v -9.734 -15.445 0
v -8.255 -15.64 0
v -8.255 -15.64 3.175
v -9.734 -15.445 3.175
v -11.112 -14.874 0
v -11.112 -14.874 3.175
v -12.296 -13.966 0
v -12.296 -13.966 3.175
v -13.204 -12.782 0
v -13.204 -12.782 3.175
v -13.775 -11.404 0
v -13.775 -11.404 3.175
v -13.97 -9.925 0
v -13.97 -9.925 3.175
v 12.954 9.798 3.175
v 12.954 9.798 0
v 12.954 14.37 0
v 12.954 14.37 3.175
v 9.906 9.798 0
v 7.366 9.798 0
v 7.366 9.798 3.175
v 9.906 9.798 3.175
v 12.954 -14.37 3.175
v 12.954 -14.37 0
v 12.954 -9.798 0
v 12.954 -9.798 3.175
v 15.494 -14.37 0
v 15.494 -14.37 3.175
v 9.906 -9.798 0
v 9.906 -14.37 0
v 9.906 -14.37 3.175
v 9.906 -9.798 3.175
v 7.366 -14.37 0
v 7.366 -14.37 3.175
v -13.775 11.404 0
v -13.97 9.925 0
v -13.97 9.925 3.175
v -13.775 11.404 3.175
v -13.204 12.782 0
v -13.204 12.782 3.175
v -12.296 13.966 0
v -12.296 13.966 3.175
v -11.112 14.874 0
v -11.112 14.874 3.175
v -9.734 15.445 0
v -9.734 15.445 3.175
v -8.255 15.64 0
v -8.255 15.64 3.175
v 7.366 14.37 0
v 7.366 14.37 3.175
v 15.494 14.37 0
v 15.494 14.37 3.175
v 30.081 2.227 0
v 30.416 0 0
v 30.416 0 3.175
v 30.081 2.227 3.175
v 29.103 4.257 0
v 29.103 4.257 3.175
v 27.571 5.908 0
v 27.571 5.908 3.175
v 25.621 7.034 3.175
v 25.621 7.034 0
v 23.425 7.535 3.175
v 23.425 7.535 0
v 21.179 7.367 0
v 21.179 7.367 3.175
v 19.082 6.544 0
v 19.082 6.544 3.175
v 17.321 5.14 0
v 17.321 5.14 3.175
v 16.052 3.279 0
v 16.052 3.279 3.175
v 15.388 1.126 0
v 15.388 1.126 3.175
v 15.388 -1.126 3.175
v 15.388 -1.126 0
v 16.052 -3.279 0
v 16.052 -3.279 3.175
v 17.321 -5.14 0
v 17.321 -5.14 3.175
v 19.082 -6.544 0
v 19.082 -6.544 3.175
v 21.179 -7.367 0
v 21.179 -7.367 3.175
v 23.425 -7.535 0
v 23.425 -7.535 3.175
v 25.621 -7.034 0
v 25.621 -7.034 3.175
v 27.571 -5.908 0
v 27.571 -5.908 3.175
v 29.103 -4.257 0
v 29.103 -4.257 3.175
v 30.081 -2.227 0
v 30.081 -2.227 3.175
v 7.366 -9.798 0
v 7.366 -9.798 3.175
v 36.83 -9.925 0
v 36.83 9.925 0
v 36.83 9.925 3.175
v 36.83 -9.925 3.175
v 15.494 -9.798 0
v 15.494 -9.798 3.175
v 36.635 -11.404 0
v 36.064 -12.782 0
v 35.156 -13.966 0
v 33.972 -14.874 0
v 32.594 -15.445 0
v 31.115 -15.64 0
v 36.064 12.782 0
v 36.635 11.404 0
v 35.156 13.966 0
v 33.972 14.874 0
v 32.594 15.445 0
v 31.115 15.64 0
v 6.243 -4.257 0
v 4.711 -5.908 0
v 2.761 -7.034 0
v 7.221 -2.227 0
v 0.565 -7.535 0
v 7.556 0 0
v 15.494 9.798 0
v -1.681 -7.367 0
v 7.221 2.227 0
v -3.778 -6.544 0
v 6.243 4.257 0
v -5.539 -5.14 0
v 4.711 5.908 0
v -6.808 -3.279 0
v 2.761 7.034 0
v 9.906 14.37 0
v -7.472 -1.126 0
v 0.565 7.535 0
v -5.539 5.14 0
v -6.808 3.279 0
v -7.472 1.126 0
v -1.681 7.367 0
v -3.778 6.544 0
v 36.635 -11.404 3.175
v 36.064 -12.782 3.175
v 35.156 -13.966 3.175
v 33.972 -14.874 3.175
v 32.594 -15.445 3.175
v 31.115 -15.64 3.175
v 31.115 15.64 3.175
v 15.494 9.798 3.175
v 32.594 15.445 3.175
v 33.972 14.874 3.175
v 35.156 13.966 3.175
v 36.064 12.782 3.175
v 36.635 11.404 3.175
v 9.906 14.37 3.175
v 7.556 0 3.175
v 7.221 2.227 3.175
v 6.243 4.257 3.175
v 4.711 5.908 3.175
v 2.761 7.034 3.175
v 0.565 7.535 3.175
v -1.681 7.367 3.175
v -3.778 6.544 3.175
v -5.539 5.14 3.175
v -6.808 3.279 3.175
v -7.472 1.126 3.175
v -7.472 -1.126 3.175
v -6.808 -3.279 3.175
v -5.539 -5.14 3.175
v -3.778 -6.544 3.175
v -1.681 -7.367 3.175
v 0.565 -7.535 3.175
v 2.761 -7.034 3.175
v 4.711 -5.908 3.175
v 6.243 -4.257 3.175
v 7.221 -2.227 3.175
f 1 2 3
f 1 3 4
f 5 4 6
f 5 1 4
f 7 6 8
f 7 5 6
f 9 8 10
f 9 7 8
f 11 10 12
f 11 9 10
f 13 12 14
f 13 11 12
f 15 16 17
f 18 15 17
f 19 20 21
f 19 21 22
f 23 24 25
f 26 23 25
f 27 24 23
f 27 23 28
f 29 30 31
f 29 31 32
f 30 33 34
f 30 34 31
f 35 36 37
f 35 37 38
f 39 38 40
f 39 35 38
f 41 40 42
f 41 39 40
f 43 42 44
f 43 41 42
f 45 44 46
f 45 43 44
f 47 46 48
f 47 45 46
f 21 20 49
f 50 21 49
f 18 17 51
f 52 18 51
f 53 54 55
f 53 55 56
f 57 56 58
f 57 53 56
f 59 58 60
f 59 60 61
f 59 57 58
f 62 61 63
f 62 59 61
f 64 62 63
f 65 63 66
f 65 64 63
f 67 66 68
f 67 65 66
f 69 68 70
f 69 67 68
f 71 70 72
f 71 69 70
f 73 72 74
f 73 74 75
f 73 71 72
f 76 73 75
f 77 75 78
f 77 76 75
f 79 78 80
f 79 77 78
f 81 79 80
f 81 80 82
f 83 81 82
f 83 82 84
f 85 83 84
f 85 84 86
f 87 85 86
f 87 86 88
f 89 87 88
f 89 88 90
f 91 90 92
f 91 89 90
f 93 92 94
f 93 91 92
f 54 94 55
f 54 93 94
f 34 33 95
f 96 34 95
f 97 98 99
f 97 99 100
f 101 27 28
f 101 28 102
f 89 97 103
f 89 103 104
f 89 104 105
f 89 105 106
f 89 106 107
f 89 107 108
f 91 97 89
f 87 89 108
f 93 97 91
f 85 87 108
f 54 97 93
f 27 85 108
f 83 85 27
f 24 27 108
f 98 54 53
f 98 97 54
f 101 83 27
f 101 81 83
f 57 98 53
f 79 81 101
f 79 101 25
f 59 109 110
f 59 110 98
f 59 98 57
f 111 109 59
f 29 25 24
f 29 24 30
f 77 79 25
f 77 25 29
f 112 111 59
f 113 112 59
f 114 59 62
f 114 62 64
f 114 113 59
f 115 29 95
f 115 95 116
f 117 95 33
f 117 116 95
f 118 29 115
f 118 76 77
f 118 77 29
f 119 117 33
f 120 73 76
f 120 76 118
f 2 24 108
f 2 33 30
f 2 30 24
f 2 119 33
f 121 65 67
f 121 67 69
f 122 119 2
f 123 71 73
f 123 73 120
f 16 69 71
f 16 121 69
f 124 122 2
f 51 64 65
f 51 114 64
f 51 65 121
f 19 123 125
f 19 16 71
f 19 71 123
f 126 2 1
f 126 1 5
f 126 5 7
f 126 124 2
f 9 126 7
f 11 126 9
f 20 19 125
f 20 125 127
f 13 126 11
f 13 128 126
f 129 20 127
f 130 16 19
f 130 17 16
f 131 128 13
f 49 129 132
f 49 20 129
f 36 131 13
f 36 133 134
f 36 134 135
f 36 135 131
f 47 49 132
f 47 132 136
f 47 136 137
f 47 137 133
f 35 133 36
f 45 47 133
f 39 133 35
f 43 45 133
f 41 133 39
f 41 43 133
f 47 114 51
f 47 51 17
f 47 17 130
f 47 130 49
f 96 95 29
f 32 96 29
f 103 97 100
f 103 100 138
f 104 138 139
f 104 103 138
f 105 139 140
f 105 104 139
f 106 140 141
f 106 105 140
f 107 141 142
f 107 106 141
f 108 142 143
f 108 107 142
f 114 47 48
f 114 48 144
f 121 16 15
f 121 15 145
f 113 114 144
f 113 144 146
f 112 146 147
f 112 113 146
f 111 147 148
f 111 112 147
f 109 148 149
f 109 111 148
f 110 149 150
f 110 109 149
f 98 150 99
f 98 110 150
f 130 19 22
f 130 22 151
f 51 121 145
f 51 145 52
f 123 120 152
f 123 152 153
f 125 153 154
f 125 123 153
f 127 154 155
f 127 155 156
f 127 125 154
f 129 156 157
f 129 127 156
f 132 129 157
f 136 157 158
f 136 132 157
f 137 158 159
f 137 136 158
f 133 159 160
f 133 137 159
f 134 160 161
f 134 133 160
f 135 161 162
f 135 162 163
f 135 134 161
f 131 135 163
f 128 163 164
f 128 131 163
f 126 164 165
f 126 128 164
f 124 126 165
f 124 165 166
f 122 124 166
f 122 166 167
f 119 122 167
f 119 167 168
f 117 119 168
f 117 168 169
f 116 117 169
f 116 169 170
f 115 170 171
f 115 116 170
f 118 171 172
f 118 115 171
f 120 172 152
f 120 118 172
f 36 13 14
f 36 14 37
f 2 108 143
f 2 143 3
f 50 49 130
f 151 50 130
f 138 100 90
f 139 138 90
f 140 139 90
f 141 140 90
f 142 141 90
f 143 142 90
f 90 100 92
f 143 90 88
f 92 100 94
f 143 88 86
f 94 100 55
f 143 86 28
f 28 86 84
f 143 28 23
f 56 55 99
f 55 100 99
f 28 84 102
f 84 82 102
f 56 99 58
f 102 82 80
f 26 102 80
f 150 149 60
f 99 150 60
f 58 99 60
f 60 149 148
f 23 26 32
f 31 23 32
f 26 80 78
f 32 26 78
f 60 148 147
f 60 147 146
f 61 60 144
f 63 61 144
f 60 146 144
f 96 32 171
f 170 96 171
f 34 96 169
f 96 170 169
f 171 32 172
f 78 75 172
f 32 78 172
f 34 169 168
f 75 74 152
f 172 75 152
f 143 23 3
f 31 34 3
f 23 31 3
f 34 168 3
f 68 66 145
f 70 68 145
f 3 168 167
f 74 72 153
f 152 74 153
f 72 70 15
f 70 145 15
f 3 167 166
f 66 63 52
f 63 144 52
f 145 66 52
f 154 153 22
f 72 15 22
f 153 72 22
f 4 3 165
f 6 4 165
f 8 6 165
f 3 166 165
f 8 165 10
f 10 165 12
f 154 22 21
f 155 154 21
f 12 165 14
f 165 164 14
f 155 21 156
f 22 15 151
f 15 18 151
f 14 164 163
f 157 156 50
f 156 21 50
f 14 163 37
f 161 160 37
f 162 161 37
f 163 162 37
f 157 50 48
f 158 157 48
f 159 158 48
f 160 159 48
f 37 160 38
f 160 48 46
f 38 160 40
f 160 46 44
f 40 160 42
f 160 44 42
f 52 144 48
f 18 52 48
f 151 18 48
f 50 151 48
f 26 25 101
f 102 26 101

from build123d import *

# Parameters (mm, degrees)
SKETCH1_R           = 7.5565
SKETCH1_W           = 2.54
SKETCH1_H           = 4.572
BOSS_EXTRUDE1_DEPTH = 3.175


with BuildPart() as part:
    # Sketch1 → Boss-Extrude1 (new body)
    with BuildSketch(Plane.XY):
        with BuildLine():
            Line((-8.255, 15.639992312), (31.115, 15.639992312))
            ThreePointArc((31.115, 15.639992312), (35.156115254, 13.966107566), (36.83, 9.924992312))
            Line((36.83, 9.924992312), (36.83, -9.924992312))
            ThreePointArc((36.83, -9.924992312), (35.156115254, -13.966107566), (31.115, -15.639992312))
            Line((31.115, -15.639992312), (-8.255, -15.639992312))
            ThreePointArc((-8.255, -15.639992312), (-12.296115254, -13.966107566), (-13.97, -9.924992312))
            Line((-13.97, -9.924992312), (-13.97, 9.924992312))
            ThreePointArc((-13.97, 9.924992312), (-12.296115254, 13.966107566), (-8.255, 15.639992312))
        make_face()
        Circle(SKETCH1_R, mode=Mode.SUBTRACT)
        with Locations((22.86, 0)):
            Circle(SKETCH1_R, mode=Mode.SUBTRACT)
        with Locations((8.636, 12.083992312)):
            Rectangle(SKETCH1_W, SKETCH1_H, mode=Mode.SUBTRACT)
        with Locations((14.224, 12.083992312)):
            Rectangle(SKETCH1_W, SKETCH1_H, mode=Mode.SUBTRACT)
        with Locations((14.224, -12.083992312)):
            Rectangle(SKETCH1_W, SKETCH1_H, mode=Mode.SUBTRACT)
        with Locations((8.636, -12.083992312)):
            Rectangle(SKETCH1_W, SKETCH1_H, mode=Mode.SUBTRACT)
    extrude(amount=BOSS_EXTRUDE1_DEPTH)


solid = part.part
